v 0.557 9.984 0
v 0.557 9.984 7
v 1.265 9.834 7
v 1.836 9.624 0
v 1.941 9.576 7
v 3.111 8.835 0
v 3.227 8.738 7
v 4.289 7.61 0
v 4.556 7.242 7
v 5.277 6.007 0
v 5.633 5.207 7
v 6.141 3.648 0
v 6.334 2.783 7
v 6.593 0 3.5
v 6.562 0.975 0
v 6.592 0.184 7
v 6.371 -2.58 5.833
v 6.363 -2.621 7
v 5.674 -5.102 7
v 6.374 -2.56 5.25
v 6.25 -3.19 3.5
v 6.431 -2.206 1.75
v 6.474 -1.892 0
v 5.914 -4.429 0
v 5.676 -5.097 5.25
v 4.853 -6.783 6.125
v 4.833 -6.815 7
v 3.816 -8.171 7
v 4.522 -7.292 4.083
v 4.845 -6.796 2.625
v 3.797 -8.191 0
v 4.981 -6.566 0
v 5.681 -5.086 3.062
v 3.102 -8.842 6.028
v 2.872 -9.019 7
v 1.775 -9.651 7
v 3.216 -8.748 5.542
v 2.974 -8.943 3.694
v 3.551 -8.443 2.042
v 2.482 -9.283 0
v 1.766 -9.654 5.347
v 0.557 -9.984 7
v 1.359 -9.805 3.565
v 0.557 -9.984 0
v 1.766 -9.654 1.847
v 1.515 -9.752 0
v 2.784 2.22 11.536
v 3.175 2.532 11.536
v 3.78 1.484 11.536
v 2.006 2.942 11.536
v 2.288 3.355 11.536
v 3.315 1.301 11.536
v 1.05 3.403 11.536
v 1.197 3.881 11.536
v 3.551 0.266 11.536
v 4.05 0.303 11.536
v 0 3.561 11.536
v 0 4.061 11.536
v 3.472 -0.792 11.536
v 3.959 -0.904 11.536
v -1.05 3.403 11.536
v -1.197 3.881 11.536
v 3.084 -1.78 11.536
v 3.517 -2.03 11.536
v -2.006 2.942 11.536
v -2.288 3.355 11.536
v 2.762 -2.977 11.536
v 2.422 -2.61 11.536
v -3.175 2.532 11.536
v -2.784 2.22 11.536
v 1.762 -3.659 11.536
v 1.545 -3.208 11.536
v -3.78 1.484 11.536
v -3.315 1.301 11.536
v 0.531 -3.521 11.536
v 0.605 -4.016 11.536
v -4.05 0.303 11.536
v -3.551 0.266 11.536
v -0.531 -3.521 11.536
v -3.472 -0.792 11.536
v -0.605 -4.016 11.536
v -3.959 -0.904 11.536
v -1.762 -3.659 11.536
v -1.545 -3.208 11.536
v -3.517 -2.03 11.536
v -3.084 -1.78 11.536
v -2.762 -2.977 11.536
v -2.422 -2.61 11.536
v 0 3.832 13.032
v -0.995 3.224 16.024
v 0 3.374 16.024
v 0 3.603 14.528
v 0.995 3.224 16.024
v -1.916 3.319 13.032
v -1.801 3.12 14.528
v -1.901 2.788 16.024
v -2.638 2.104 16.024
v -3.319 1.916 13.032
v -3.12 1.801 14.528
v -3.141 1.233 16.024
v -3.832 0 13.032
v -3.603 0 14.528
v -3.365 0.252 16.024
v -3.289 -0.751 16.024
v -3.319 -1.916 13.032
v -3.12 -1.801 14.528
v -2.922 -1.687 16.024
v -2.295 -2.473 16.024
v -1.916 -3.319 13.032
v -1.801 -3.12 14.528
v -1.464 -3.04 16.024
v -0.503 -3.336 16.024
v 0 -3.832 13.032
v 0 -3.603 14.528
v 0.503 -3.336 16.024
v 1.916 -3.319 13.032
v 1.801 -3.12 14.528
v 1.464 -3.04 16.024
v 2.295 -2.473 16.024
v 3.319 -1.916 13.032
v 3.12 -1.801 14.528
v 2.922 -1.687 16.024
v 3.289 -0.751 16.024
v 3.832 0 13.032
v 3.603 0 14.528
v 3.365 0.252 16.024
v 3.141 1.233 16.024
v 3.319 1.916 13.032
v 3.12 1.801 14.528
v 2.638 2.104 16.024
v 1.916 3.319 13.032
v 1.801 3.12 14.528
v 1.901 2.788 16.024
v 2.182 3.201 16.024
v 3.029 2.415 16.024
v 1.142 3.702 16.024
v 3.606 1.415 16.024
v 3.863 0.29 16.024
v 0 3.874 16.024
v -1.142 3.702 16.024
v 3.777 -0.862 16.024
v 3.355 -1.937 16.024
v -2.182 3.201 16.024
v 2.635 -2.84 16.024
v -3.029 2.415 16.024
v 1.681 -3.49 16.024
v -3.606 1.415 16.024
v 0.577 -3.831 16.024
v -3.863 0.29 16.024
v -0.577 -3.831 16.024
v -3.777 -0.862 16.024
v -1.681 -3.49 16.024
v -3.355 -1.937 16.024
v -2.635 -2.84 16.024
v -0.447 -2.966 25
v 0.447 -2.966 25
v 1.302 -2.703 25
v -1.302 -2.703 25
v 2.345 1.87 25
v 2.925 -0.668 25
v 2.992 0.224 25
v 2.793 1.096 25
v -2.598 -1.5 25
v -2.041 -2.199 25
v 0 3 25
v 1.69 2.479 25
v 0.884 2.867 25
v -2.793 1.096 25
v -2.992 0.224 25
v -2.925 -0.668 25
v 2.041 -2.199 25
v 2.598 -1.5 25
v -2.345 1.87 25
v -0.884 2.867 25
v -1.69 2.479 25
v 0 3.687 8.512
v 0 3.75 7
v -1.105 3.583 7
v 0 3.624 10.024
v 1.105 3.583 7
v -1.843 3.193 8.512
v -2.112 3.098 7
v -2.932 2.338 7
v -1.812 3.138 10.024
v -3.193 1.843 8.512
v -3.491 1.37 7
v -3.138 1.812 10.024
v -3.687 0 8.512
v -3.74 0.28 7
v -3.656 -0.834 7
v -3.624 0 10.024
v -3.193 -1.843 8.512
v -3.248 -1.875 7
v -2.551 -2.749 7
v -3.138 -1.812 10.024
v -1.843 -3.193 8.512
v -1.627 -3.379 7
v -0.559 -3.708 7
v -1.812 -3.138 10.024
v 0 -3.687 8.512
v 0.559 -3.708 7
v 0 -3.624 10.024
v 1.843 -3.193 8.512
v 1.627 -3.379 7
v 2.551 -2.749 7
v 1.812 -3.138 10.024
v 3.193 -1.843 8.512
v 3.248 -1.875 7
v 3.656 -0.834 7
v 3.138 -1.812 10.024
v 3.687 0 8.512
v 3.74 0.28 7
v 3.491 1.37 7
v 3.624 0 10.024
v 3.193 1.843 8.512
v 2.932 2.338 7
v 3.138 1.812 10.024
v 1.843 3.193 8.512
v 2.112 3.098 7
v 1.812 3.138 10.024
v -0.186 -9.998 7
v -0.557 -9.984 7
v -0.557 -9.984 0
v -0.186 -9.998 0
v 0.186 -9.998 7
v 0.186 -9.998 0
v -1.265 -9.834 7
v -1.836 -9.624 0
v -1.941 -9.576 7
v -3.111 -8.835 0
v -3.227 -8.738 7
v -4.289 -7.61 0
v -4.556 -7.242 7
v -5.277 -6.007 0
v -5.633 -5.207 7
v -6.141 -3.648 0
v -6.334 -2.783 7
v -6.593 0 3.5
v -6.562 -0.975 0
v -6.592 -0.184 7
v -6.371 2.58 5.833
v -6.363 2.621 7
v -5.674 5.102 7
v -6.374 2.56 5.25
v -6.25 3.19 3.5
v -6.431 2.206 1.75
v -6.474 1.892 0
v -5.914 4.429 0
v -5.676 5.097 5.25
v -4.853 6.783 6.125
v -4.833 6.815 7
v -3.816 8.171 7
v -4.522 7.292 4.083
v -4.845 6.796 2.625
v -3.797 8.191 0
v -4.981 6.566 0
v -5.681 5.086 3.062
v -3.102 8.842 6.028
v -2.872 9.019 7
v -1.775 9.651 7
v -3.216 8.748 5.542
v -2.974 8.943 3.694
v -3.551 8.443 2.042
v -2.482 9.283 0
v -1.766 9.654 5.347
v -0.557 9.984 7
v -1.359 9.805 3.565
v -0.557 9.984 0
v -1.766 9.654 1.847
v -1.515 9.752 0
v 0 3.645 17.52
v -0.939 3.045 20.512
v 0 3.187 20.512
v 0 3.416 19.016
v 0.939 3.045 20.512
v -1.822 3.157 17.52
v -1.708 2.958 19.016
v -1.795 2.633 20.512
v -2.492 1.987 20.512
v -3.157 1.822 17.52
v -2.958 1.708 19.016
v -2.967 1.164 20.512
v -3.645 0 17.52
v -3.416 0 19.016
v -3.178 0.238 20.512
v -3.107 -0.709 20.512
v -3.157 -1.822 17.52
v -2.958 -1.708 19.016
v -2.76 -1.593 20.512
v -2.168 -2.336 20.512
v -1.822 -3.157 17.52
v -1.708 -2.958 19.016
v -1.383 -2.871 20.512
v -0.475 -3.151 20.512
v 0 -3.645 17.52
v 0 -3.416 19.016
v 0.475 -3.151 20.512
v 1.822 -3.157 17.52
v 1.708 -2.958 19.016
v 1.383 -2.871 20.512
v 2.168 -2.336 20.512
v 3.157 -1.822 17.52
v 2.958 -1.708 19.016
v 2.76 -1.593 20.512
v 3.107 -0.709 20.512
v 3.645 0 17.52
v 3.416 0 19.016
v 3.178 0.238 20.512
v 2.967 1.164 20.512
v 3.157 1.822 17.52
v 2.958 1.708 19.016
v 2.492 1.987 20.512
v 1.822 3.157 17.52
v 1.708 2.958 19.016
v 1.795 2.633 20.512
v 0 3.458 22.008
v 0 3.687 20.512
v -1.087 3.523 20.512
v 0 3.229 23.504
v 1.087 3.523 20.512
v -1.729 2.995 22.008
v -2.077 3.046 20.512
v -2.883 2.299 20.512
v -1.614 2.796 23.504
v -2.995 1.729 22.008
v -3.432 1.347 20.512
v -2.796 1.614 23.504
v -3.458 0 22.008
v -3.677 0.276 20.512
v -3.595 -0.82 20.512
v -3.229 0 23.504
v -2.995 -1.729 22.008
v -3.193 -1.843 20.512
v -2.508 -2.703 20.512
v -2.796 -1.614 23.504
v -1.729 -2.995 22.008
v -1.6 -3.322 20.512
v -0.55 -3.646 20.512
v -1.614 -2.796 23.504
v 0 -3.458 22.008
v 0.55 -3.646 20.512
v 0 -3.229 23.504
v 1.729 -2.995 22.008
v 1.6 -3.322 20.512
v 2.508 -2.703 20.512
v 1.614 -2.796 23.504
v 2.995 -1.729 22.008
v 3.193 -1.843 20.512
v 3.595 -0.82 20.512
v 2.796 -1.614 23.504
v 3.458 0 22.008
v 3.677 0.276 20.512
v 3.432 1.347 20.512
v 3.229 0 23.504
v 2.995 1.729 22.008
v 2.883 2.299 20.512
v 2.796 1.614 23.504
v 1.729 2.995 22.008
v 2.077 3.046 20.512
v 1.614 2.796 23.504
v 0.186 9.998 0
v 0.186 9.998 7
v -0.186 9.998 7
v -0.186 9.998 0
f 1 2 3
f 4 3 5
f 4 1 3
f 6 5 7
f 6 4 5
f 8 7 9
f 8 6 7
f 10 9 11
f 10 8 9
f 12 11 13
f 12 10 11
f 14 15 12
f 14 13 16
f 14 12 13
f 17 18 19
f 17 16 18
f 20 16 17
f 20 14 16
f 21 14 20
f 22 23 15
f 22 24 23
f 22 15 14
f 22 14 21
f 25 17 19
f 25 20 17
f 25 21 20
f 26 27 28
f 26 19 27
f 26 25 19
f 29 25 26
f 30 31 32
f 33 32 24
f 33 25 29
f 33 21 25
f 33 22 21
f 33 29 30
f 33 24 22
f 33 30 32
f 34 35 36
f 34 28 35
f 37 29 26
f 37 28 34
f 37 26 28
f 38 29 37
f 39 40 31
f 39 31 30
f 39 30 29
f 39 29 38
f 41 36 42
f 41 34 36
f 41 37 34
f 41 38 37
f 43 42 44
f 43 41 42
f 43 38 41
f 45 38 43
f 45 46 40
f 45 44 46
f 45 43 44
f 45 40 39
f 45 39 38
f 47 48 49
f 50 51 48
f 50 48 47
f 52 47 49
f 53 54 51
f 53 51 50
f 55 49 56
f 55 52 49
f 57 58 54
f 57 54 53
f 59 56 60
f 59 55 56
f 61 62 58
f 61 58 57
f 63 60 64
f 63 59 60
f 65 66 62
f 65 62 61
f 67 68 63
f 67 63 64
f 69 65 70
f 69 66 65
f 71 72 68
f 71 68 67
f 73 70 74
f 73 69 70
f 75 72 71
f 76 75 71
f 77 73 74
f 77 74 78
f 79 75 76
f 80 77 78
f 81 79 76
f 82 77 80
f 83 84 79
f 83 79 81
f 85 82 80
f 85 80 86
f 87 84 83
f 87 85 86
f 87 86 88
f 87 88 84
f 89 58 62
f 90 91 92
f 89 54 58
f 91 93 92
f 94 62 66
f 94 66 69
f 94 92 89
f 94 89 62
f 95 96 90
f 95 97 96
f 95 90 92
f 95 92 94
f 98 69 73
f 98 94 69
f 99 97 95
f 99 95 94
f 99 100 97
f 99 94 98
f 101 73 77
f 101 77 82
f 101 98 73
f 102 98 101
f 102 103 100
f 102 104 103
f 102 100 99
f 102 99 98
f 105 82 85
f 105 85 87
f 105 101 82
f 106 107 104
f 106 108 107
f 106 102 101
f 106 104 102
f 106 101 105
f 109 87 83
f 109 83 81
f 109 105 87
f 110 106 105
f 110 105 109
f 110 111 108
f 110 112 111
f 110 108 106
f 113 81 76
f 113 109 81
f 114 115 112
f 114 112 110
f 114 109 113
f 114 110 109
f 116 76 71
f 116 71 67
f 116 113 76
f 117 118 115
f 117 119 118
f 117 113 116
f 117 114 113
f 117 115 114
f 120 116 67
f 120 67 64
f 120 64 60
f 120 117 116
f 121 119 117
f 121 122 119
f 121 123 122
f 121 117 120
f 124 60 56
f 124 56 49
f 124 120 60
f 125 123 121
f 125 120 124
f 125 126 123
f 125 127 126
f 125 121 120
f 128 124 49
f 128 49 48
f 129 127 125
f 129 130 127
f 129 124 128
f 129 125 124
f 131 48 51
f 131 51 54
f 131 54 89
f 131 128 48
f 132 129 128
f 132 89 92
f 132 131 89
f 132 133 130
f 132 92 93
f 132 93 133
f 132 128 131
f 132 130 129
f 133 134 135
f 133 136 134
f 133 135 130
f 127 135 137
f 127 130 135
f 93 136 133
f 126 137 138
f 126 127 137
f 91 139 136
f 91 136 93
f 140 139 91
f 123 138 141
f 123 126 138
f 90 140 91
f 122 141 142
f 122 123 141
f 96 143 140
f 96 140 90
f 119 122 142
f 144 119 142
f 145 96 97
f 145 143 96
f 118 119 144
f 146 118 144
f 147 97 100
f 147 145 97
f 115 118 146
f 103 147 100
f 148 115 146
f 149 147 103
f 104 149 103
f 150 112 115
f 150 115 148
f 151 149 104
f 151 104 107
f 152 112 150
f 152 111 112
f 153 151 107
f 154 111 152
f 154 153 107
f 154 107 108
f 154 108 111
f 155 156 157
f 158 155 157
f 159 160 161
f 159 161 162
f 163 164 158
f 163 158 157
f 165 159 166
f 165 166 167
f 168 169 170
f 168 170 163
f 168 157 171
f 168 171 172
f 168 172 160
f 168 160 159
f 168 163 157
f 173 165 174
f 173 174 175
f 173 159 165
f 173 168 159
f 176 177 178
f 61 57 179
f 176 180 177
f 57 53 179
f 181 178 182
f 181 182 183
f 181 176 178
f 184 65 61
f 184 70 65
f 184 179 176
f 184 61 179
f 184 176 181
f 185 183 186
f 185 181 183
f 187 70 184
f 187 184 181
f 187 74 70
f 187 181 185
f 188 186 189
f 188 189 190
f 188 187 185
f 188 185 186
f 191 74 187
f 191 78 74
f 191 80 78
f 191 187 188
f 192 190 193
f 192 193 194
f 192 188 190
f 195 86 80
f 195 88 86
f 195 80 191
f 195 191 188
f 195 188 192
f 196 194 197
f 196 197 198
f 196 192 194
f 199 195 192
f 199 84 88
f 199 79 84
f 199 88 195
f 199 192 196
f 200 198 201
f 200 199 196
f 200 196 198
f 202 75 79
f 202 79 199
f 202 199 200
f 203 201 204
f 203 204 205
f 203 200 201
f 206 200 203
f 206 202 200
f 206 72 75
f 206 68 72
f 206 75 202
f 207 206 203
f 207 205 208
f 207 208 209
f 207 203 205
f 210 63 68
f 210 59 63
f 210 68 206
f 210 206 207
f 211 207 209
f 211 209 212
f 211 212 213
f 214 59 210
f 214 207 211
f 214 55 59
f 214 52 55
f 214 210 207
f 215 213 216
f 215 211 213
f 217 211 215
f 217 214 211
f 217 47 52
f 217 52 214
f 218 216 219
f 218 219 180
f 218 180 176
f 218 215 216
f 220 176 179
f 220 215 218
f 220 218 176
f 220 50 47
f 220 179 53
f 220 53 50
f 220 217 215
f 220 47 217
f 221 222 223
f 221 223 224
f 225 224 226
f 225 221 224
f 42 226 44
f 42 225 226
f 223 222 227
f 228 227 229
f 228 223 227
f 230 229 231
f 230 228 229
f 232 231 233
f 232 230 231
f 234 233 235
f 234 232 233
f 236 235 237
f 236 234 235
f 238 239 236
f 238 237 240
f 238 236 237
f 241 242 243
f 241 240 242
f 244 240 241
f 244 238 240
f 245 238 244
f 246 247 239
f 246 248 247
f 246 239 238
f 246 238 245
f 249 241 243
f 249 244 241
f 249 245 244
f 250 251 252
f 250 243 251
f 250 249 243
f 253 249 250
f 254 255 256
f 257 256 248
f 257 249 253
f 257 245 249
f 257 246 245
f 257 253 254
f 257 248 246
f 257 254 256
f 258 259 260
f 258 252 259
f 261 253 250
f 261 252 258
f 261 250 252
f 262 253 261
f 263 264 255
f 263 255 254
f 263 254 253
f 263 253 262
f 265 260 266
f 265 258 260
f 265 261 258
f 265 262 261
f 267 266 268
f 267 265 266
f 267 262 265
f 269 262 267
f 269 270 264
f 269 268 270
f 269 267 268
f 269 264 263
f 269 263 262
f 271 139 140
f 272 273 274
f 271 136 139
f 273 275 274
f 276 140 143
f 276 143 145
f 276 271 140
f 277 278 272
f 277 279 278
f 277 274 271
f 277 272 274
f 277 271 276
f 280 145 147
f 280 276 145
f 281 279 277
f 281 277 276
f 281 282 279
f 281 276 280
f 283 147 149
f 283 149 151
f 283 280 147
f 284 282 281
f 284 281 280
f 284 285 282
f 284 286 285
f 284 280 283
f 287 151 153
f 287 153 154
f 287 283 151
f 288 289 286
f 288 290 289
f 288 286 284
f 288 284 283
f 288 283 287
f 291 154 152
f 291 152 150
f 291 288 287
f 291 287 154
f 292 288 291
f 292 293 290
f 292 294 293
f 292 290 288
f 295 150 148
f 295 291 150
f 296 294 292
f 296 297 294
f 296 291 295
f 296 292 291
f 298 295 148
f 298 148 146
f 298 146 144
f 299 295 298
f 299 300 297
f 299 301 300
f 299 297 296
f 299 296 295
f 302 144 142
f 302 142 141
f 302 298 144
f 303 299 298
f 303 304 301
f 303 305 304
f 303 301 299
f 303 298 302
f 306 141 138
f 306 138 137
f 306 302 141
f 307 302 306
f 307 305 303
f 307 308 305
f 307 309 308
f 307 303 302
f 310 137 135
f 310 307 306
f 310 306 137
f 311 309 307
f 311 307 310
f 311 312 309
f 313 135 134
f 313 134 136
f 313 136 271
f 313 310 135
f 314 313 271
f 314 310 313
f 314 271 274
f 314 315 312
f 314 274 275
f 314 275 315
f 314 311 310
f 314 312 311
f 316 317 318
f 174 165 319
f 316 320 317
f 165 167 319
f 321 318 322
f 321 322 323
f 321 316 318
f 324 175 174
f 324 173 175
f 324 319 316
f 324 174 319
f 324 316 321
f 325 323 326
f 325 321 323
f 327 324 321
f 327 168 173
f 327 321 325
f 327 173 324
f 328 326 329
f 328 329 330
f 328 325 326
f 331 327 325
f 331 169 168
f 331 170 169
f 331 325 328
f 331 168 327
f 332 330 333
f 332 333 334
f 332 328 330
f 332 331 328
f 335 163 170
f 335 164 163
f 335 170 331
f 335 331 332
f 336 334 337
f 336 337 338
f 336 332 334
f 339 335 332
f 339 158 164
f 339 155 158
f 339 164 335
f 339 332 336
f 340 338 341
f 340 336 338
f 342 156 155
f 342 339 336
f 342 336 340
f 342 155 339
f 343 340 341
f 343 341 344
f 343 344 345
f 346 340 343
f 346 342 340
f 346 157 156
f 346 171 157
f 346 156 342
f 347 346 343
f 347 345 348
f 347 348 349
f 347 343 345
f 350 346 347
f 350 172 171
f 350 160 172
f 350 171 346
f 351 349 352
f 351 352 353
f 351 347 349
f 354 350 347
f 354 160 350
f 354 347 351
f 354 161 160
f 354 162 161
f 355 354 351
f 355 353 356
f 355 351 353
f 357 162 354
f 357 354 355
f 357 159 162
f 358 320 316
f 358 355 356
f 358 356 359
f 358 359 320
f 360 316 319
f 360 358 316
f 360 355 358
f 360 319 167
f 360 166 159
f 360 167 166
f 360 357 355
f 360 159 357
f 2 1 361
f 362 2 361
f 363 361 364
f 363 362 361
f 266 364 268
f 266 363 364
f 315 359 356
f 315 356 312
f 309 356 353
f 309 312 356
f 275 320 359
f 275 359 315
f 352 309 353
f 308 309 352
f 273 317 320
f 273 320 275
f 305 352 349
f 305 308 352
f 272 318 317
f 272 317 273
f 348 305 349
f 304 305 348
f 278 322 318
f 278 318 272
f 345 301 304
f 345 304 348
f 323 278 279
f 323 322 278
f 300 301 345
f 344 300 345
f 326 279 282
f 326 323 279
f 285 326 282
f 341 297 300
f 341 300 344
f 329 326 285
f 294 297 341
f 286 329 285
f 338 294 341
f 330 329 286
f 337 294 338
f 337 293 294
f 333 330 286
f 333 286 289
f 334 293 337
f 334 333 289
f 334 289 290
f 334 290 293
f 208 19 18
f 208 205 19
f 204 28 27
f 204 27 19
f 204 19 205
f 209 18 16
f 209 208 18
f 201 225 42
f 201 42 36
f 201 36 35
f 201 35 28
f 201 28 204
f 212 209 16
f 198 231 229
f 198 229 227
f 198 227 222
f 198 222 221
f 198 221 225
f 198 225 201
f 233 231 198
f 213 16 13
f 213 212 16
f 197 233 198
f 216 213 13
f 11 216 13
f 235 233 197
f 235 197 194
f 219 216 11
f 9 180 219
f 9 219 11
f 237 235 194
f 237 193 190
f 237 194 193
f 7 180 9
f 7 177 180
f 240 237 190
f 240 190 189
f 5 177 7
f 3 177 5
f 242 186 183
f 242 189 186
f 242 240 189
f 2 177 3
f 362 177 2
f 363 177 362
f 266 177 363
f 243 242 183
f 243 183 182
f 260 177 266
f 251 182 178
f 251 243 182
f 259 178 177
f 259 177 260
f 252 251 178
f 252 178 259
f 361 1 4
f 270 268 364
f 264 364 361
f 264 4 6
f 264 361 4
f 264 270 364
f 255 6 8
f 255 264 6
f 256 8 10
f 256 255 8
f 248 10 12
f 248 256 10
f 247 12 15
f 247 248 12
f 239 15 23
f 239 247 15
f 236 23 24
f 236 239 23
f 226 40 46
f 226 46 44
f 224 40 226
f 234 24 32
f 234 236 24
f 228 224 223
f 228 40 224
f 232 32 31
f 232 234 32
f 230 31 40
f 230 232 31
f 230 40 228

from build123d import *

# Parameters (mm, degrees)
F3_DEPTH = 25.001


with BuildPart() as f1:
    # F0 (on Right) → F1 (revolve)
    with BuildSketch(Plane.YZ):
        Polygon((3, 25), (0, 25), (0, 0), (10, 0), (10, 7), (3.75, 7), (3.560989338, 11.5362558876), (4.060989338, 11.5362558876), (3.373992892, 16.0241705917), (3.873992892, 16.0241705917), (3.186996446, 20.5120852959), (3.686996446, 20.5120852959), align=None)
    revolve(axis=Axis((0, 0, 31.1523070624), (0, 0, 1)))

    # F2 (on face) → F3 (intersect, through all)
    with BuildSketch(Plane(origin=(0, 0, 0), x_dir=(1, 0, 0), z_dir=(0, 0, -1))):
        with BuildLine():
            add(Edge.make_bspline(
                [(0.5574438539, -9.9844507285), (6.5930374607, -9.2060736587), (6.5930374607, 0), (6.5930374607, 9.2060736587), (0.5574438539, 9.9844507285)],
                knots=[0.0846514487, 0.0846514487, 0.0846514487, 1.5707963268, 1.5707963268, 3.0569412049, 3.0569412049, 3.0569412049], degree=2, weights=[1, 0.736393368, 1, 0.736393368, 1]))
            ThreePointArc((0.5574438539, 9.9844507285), (0, 10), (-0.5574438539, 9.9844507285))
            add(Edge.make_bspline(
                [(-0.5574438539, 9.9844507285), (-6.5930374607, 9.2060736587), (-6.5930374607, 0), (-6.5930374607, -9.2060736587), (-0.5574438539, -9.9844507285)],
                knots=[3.2262441023, 3.2262441023, 3.2262441023, 4.7123889804, 4.7123889804, 6.1985338585, 6.1985338585, 6.1985338585], degree=2, weights=[1, 0.736393368, 1, 0.736393368, 1]))
            ThreePointArc((-0.5574438539, -9.9844507285), (0, -10), (0.5574438539, -9.9844507285))
        make_face()
    extrude(amount=-F3_DEPTH, mode=Mode.INTERSECT)


solid = f1.part
